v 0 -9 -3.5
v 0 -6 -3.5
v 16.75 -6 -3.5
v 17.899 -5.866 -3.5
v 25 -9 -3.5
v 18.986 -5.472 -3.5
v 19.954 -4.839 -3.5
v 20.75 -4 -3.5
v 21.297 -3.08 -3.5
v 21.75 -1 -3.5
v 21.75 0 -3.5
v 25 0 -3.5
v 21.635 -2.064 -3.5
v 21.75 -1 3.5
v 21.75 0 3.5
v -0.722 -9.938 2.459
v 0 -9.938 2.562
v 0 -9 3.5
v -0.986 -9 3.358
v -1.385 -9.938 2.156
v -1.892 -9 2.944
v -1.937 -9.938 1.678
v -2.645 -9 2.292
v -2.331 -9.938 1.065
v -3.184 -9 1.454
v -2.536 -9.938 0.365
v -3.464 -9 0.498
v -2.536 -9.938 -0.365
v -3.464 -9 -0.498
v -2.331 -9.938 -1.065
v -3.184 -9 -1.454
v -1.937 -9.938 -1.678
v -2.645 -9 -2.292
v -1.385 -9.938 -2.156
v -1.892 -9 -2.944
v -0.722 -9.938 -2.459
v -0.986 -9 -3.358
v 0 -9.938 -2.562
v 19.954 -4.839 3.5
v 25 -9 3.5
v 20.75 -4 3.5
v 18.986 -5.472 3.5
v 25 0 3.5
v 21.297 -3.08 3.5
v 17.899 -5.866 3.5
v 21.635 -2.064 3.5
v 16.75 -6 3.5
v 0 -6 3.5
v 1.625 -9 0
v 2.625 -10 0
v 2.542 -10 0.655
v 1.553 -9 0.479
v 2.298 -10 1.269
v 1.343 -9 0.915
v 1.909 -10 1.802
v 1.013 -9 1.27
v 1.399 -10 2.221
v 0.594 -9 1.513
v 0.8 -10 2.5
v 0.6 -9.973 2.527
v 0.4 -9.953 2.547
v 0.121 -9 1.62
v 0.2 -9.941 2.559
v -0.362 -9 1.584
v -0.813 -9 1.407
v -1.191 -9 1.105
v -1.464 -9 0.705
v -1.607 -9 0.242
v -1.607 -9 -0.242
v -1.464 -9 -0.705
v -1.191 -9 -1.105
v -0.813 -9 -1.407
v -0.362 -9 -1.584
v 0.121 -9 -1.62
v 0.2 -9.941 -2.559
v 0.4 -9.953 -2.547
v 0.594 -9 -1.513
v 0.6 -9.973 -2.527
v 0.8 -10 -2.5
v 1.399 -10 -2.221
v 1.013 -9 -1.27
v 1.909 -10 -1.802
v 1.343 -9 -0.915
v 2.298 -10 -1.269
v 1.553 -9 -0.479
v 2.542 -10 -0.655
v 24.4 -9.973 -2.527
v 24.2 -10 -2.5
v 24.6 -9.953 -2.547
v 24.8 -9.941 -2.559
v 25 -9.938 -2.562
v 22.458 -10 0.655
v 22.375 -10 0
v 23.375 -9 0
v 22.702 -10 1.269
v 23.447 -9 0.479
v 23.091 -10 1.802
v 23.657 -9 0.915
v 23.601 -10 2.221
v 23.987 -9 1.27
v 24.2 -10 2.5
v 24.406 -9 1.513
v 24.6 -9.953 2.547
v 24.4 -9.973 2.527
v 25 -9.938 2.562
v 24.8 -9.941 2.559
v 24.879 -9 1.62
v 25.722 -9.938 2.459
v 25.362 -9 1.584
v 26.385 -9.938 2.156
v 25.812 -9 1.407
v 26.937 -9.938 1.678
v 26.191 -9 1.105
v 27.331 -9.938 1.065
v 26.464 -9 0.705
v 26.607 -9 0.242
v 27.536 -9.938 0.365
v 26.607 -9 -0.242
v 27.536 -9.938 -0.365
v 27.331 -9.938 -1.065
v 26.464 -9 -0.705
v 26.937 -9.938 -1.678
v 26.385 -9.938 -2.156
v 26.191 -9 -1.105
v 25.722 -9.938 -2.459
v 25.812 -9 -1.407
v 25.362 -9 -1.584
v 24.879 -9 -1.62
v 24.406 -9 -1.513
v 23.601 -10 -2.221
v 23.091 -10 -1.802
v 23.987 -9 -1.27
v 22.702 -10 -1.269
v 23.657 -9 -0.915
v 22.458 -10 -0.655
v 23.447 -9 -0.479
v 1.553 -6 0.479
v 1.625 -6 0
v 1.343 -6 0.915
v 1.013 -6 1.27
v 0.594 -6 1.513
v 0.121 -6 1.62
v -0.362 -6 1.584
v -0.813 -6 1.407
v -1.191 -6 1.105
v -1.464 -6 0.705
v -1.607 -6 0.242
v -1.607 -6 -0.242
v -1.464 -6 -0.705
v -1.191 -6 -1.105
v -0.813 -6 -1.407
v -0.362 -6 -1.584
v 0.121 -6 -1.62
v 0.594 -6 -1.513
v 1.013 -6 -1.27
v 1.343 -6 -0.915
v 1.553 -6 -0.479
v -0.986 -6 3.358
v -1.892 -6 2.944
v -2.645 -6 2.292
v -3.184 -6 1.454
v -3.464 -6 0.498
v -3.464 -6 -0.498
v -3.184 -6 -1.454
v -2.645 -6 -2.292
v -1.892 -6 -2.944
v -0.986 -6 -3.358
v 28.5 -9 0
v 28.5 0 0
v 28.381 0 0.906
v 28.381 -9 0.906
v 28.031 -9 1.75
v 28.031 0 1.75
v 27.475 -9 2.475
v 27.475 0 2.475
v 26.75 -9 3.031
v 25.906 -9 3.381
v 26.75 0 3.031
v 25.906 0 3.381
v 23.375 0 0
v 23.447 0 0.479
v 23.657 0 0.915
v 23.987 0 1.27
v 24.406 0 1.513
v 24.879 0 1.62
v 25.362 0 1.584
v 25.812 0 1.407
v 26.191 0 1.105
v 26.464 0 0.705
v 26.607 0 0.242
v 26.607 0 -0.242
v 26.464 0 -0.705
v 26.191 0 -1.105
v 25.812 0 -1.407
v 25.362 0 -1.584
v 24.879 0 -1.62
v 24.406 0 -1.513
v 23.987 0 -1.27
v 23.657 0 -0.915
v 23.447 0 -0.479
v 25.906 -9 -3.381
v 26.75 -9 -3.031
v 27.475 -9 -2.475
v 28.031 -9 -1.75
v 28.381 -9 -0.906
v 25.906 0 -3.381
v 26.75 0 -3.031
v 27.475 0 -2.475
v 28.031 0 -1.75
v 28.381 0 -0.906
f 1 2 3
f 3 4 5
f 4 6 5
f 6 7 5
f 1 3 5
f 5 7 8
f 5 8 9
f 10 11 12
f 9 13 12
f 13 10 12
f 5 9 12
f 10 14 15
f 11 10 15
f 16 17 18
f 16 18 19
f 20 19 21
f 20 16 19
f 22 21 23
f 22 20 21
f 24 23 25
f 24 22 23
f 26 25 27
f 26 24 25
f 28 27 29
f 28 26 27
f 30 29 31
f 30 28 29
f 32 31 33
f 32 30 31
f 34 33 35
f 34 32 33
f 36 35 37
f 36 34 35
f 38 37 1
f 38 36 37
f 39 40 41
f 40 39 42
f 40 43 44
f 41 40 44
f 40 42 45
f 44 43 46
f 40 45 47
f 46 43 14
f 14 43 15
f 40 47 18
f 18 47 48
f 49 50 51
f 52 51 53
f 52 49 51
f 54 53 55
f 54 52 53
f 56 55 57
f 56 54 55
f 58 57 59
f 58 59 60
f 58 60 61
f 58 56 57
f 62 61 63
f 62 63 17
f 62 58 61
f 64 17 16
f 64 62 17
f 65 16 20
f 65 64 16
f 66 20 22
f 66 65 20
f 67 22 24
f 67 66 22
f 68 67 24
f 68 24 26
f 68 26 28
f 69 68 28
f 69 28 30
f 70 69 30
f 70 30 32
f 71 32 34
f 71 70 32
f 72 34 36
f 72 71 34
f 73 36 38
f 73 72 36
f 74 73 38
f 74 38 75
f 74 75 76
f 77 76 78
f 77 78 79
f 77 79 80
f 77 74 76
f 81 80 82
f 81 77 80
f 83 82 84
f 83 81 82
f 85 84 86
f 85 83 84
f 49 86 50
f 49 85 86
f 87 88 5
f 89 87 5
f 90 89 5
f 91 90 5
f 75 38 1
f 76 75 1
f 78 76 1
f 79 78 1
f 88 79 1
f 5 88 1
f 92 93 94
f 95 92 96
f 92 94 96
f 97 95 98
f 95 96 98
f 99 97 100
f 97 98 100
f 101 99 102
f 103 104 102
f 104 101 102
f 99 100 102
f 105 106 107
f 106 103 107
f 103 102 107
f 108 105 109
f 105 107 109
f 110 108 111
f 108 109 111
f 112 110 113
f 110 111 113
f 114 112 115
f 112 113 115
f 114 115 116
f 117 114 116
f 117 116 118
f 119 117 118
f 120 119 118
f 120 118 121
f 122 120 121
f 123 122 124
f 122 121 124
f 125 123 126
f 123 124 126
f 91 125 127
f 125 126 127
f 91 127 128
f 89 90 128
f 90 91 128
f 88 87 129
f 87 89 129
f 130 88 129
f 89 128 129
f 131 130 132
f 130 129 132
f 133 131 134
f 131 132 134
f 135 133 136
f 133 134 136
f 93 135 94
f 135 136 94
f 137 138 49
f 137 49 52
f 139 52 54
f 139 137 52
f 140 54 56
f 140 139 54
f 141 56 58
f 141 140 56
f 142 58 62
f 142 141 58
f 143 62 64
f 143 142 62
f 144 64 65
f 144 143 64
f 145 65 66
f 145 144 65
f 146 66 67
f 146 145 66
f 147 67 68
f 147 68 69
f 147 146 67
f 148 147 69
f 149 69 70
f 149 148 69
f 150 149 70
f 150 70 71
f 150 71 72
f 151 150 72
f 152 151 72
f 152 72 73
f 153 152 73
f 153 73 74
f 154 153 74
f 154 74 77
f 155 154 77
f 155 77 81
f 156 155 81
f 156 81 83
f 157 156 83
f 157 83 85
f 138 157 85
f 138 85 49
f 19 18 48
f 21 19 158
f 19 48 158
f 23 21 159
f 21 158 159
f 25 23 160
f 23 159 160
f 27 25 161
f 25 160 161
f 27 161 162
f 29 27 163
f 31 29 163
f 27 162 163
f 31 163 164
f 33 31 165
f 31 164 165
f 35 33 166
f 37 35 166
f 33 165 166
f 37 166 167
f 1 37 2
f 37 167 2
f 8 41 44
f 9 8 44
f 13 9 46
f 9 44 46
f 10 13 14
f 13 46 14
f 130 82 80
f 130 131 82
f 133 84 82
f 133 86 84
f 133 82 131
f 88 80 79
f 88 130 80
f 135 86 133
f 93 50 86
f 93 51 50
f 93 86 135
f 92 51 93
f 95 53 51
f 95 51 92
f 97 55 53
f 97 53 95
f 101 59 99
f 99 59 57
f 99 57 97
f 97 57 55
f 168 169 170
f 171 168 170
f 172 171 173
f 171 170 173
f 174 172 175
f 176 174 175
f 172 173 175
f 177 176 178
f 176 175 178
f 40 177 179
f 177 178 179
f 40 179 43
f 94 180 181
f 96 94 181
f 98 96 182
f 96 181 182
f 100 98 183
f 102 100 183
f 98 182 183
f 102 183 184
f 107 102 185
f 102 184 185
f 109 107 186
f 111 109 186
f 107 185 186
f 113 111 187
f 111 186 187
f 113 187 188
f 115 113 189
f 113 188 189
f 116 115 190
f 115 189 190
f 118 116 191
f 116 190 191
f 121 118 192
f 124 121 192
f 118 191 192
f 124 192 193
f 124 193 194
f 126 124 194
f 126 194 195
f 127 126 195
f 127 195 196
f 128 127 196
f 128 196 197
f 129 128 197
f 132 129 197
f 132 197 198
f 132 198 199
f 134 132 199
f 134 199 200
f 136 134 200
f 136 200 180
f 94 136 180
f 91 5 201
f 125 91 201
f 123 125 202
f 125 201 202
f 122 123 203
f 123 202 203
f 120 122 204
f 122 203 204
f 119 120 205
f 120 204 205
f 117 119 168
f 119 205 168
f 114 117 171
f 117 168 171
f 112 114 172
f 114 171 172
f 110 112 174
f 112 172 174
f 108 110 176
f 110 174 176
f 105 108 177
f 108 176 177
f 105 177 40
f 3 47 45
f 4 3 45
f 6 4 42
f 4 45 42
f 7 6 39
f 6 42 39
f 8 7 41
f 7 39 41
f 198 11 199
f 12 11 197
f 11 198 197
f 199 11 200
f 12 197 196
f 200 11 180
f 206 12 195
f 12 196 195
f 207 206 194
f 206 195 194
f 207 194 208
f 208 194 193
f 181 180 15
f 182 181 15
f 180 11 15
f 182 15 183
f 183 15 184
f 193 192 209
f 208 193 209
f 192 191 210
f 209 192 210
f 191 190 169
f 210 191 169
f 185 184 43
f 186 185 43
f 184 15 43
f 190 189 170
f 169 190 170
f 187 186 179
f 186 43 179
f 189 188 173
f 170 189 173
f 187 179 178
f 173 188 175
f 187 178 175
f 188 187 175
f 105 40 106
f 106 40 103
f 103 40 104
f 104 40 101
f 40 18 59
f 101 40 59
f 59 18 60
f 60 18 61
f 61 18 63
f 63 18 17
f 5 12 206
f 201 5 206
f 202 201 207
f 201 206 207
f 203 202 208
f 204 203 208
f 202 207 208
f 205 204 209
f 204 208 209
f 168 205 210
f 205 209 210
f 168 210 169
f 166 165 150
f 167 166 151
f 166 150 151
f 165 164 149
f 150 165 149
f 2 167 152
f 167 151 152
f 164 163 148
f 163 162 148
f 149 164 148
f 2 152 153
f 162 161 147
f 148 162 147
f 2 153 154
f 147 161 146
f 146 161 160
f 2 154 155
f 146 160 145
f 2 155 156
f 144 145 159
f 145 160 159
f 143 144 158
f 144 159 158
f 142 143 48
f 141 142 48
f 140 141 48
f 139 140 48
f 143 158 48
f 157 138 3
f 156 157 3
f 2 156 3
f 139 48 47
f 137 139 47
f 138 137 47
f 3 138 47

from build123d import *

# Parameters (mm, degrees)
F0_R        = 1.625
F1_DEPTH    = 10
F2_W        = 7.875
F2_H        = 2
F2_H_2      = 4
F2_W_2      = 3.5925165284
F1_FACE1_W  = 25
F1_FACE1_H  = 10
F3_DEPTH    = 25
F4_T1_DEPTH = 25
F4_T4_ANGLE = 180
F4_T6_ANGLE = 180


# Not quite as in the source:
# - a fillet or chamfer that OpenCascade refuses, or shapes differently, is made with other operations: its cross-section is extruded or revolved along the edge and cut away or added


with BuildPart() as f1:
    # F0 (on Front) → F1 (new body)
    with BuildSketch(Plane.XZ):
        with BuildLine():
            ThreePointArc((0, -3.5), (2.4748737342, -2.4748737342), (3.5, 0))
            ThreePointArc((3.5, 0), (2.4748737342, 2.4748737342), (0, 3.5))
            ThreePointArc((0, 3.5), (-3.5, 0), (0, -3.5))
        make_face()
        Circle(F0_R, mode=Mode.SUBTRACT)
        with BuildLine():
            ThreePointArc((0, 3.5), (2.4748737342, 2.4748737342), (3.5, 0))
            Line((3.5, 0), (21.5, 0))
            ThreePointArc((21.5, 0), (22.5251262658, 2.4748737342), (25, 3.5))
            Line((25, 3.5), (0, 3.5))
        make_face()
        with BuildLine():
            Line((21.5, 0), (3.5, 0))
            ThreePointArc((3.5, 0), (2.4748737342, -2.4748737342), (0, -3.5))
            Line((0, -3.5), (25, -3.5))
            ThreePointArc((25, -3.5), (22.5251262658, -2.4748737342), (21.5, 0))
        make_face()
        with BuildLine():
            ThreePointArc((25, 3.5), (22.5251262658, 2.4748737342), (21.5, 0))
            ThreePointArc((21.5, 0), (22.5251262658, -2.4748737342), (25, -3.5))
            ThreePointArc((25, -3.5), (27.4748737342, -2.4748737342), (28.5, 0))
            ThreePointArc((28.5, 0), (27.4748737342, 2.4748737342), (25, 3.5))
        make_face()
        with BuildLine():
            ThreePointArc((26.625, 0), (25, -1.625), (23.375, 0))
            ThreePointArc((23.375, 0), (25, 1.625), (26.625, 0))
        make_face(mode=Mode.SUBTRACT)
    extrude(amount=F1_DEPTH)

    # F2 (on face) + F1_face1 (on face) → F3 (cut)
    with BuildSketch(Plane.XY.offset(3.5)):
        with Locations((3.9375, -5)):
            Rectangle(F2_W, F2_H)
        with Locations((3.9375, -2)):
            Rectangle(F2_W, F2_H_2)
        with Locations((11.8125, -5)):
            Rectangle(F2_W, F2_H)
        with Locations((-1.7962582642, -2)):
            Rectangle(F2_W_2, F2_H_2)
        with Locations((-1.7962582642, -5)):
            Rectangle(F2_W_2, F2_H)
        with Locations((11.8125, -2)):
            Rectangle(F2_W, F2_H_2)
        with BuildLine():
            Line((21.75, 0), (15.75, 0))
            Line((15.75, 0), (15.75, -4))
            Line((15.75, -4), (20.75, -4))
            ThreePointArc((20.75, -4), (21.4934164903, -2.5811388301), (21.75, -1))
            Line((21.75, -1), (21.75, 0))
        make_face()
        with BuildLine():
            Line((20.75, -4), (15.75, -4))
            Line((15.75, -4), (15.75, -6))
            Line((15.75, -6), (16.75, -6))
            ThreePointArc((16.75, -6), (18.9860679775, -5.472135955), (20.75, -4))
        make_face()
    with BuildSketch(Plane(origin=(12.5, -5, -3.5), x_dir=(1, 0, 0), z_dir=(0, 0, -1))):
        Rectangle(F1_FACE1_W, F1_FACE1_H)
    extrude(amount=-F3_DEPTH, dir=(0, 0, 1), mode=Mode.SUBTRACT)

    # F4: chamfer of 1 on 6 edges, made by hand

    # F4_s2 → F4_t1 (cut)
    with BuildSketch(Plane.YZ):
        Polygon((-9, 3.5), (-10, 2.5), (-10, 3.5), align=None)
        Polygon((-10, -2.5), (-9, -3.5), (-10, -3.5), align=None)
    extrude(amount=F4_T1_DEPTH, mode=Mode.SUBTRACT)

    # F4_s3 → F4_t4 (revolve, cut)
    with BuildSketch(Plane.YZ):
        Polygon((-9, 3.5), (-10, 2.5), (-10, 3.5), align=None)
    revolve(axis=Axis((0, -10, 0), (0, -1, 0)), revolution_arc=F4_T4_ANGLE, mode=Mode.SUBTRACT)

    # F4_s5 → F4_t6 (revolve, cut)
    with BuildSketch(Plane.YZ.offset(25)):
        Polygon((-10, -2.5), (-9, -3.5), (-10, -3.5), align=None)
    revolve(axis=Axis((25, -10, 0), (0, -1, 0)), revolution_arc=F4_T6_ANGLE, mode=Mode.SUBTRACT)

    # F4_s7 → F4_t8 (revolve, cut)
    with BuildSketch(Plane.XY):
        Polygon((2.625, -10), (1.625, -9), (1.625, -10), align=None)
    revolve(axis=Axis((0, -10, 0), (0, -1, 0)), mode=Mode.SUBTRACT)

    # F4_s9 → F4_t10 (revolve, cut)
    with BuildSketch(Plane.XY):
        Polygon((22.375, -10), (23.375, -9), (23.375, -10), align=None)
    revolve(axis=Axis((25, -10, 0), (0, 1, 0)), mode=Mode.SUBTRACT)


solid = f1.part
